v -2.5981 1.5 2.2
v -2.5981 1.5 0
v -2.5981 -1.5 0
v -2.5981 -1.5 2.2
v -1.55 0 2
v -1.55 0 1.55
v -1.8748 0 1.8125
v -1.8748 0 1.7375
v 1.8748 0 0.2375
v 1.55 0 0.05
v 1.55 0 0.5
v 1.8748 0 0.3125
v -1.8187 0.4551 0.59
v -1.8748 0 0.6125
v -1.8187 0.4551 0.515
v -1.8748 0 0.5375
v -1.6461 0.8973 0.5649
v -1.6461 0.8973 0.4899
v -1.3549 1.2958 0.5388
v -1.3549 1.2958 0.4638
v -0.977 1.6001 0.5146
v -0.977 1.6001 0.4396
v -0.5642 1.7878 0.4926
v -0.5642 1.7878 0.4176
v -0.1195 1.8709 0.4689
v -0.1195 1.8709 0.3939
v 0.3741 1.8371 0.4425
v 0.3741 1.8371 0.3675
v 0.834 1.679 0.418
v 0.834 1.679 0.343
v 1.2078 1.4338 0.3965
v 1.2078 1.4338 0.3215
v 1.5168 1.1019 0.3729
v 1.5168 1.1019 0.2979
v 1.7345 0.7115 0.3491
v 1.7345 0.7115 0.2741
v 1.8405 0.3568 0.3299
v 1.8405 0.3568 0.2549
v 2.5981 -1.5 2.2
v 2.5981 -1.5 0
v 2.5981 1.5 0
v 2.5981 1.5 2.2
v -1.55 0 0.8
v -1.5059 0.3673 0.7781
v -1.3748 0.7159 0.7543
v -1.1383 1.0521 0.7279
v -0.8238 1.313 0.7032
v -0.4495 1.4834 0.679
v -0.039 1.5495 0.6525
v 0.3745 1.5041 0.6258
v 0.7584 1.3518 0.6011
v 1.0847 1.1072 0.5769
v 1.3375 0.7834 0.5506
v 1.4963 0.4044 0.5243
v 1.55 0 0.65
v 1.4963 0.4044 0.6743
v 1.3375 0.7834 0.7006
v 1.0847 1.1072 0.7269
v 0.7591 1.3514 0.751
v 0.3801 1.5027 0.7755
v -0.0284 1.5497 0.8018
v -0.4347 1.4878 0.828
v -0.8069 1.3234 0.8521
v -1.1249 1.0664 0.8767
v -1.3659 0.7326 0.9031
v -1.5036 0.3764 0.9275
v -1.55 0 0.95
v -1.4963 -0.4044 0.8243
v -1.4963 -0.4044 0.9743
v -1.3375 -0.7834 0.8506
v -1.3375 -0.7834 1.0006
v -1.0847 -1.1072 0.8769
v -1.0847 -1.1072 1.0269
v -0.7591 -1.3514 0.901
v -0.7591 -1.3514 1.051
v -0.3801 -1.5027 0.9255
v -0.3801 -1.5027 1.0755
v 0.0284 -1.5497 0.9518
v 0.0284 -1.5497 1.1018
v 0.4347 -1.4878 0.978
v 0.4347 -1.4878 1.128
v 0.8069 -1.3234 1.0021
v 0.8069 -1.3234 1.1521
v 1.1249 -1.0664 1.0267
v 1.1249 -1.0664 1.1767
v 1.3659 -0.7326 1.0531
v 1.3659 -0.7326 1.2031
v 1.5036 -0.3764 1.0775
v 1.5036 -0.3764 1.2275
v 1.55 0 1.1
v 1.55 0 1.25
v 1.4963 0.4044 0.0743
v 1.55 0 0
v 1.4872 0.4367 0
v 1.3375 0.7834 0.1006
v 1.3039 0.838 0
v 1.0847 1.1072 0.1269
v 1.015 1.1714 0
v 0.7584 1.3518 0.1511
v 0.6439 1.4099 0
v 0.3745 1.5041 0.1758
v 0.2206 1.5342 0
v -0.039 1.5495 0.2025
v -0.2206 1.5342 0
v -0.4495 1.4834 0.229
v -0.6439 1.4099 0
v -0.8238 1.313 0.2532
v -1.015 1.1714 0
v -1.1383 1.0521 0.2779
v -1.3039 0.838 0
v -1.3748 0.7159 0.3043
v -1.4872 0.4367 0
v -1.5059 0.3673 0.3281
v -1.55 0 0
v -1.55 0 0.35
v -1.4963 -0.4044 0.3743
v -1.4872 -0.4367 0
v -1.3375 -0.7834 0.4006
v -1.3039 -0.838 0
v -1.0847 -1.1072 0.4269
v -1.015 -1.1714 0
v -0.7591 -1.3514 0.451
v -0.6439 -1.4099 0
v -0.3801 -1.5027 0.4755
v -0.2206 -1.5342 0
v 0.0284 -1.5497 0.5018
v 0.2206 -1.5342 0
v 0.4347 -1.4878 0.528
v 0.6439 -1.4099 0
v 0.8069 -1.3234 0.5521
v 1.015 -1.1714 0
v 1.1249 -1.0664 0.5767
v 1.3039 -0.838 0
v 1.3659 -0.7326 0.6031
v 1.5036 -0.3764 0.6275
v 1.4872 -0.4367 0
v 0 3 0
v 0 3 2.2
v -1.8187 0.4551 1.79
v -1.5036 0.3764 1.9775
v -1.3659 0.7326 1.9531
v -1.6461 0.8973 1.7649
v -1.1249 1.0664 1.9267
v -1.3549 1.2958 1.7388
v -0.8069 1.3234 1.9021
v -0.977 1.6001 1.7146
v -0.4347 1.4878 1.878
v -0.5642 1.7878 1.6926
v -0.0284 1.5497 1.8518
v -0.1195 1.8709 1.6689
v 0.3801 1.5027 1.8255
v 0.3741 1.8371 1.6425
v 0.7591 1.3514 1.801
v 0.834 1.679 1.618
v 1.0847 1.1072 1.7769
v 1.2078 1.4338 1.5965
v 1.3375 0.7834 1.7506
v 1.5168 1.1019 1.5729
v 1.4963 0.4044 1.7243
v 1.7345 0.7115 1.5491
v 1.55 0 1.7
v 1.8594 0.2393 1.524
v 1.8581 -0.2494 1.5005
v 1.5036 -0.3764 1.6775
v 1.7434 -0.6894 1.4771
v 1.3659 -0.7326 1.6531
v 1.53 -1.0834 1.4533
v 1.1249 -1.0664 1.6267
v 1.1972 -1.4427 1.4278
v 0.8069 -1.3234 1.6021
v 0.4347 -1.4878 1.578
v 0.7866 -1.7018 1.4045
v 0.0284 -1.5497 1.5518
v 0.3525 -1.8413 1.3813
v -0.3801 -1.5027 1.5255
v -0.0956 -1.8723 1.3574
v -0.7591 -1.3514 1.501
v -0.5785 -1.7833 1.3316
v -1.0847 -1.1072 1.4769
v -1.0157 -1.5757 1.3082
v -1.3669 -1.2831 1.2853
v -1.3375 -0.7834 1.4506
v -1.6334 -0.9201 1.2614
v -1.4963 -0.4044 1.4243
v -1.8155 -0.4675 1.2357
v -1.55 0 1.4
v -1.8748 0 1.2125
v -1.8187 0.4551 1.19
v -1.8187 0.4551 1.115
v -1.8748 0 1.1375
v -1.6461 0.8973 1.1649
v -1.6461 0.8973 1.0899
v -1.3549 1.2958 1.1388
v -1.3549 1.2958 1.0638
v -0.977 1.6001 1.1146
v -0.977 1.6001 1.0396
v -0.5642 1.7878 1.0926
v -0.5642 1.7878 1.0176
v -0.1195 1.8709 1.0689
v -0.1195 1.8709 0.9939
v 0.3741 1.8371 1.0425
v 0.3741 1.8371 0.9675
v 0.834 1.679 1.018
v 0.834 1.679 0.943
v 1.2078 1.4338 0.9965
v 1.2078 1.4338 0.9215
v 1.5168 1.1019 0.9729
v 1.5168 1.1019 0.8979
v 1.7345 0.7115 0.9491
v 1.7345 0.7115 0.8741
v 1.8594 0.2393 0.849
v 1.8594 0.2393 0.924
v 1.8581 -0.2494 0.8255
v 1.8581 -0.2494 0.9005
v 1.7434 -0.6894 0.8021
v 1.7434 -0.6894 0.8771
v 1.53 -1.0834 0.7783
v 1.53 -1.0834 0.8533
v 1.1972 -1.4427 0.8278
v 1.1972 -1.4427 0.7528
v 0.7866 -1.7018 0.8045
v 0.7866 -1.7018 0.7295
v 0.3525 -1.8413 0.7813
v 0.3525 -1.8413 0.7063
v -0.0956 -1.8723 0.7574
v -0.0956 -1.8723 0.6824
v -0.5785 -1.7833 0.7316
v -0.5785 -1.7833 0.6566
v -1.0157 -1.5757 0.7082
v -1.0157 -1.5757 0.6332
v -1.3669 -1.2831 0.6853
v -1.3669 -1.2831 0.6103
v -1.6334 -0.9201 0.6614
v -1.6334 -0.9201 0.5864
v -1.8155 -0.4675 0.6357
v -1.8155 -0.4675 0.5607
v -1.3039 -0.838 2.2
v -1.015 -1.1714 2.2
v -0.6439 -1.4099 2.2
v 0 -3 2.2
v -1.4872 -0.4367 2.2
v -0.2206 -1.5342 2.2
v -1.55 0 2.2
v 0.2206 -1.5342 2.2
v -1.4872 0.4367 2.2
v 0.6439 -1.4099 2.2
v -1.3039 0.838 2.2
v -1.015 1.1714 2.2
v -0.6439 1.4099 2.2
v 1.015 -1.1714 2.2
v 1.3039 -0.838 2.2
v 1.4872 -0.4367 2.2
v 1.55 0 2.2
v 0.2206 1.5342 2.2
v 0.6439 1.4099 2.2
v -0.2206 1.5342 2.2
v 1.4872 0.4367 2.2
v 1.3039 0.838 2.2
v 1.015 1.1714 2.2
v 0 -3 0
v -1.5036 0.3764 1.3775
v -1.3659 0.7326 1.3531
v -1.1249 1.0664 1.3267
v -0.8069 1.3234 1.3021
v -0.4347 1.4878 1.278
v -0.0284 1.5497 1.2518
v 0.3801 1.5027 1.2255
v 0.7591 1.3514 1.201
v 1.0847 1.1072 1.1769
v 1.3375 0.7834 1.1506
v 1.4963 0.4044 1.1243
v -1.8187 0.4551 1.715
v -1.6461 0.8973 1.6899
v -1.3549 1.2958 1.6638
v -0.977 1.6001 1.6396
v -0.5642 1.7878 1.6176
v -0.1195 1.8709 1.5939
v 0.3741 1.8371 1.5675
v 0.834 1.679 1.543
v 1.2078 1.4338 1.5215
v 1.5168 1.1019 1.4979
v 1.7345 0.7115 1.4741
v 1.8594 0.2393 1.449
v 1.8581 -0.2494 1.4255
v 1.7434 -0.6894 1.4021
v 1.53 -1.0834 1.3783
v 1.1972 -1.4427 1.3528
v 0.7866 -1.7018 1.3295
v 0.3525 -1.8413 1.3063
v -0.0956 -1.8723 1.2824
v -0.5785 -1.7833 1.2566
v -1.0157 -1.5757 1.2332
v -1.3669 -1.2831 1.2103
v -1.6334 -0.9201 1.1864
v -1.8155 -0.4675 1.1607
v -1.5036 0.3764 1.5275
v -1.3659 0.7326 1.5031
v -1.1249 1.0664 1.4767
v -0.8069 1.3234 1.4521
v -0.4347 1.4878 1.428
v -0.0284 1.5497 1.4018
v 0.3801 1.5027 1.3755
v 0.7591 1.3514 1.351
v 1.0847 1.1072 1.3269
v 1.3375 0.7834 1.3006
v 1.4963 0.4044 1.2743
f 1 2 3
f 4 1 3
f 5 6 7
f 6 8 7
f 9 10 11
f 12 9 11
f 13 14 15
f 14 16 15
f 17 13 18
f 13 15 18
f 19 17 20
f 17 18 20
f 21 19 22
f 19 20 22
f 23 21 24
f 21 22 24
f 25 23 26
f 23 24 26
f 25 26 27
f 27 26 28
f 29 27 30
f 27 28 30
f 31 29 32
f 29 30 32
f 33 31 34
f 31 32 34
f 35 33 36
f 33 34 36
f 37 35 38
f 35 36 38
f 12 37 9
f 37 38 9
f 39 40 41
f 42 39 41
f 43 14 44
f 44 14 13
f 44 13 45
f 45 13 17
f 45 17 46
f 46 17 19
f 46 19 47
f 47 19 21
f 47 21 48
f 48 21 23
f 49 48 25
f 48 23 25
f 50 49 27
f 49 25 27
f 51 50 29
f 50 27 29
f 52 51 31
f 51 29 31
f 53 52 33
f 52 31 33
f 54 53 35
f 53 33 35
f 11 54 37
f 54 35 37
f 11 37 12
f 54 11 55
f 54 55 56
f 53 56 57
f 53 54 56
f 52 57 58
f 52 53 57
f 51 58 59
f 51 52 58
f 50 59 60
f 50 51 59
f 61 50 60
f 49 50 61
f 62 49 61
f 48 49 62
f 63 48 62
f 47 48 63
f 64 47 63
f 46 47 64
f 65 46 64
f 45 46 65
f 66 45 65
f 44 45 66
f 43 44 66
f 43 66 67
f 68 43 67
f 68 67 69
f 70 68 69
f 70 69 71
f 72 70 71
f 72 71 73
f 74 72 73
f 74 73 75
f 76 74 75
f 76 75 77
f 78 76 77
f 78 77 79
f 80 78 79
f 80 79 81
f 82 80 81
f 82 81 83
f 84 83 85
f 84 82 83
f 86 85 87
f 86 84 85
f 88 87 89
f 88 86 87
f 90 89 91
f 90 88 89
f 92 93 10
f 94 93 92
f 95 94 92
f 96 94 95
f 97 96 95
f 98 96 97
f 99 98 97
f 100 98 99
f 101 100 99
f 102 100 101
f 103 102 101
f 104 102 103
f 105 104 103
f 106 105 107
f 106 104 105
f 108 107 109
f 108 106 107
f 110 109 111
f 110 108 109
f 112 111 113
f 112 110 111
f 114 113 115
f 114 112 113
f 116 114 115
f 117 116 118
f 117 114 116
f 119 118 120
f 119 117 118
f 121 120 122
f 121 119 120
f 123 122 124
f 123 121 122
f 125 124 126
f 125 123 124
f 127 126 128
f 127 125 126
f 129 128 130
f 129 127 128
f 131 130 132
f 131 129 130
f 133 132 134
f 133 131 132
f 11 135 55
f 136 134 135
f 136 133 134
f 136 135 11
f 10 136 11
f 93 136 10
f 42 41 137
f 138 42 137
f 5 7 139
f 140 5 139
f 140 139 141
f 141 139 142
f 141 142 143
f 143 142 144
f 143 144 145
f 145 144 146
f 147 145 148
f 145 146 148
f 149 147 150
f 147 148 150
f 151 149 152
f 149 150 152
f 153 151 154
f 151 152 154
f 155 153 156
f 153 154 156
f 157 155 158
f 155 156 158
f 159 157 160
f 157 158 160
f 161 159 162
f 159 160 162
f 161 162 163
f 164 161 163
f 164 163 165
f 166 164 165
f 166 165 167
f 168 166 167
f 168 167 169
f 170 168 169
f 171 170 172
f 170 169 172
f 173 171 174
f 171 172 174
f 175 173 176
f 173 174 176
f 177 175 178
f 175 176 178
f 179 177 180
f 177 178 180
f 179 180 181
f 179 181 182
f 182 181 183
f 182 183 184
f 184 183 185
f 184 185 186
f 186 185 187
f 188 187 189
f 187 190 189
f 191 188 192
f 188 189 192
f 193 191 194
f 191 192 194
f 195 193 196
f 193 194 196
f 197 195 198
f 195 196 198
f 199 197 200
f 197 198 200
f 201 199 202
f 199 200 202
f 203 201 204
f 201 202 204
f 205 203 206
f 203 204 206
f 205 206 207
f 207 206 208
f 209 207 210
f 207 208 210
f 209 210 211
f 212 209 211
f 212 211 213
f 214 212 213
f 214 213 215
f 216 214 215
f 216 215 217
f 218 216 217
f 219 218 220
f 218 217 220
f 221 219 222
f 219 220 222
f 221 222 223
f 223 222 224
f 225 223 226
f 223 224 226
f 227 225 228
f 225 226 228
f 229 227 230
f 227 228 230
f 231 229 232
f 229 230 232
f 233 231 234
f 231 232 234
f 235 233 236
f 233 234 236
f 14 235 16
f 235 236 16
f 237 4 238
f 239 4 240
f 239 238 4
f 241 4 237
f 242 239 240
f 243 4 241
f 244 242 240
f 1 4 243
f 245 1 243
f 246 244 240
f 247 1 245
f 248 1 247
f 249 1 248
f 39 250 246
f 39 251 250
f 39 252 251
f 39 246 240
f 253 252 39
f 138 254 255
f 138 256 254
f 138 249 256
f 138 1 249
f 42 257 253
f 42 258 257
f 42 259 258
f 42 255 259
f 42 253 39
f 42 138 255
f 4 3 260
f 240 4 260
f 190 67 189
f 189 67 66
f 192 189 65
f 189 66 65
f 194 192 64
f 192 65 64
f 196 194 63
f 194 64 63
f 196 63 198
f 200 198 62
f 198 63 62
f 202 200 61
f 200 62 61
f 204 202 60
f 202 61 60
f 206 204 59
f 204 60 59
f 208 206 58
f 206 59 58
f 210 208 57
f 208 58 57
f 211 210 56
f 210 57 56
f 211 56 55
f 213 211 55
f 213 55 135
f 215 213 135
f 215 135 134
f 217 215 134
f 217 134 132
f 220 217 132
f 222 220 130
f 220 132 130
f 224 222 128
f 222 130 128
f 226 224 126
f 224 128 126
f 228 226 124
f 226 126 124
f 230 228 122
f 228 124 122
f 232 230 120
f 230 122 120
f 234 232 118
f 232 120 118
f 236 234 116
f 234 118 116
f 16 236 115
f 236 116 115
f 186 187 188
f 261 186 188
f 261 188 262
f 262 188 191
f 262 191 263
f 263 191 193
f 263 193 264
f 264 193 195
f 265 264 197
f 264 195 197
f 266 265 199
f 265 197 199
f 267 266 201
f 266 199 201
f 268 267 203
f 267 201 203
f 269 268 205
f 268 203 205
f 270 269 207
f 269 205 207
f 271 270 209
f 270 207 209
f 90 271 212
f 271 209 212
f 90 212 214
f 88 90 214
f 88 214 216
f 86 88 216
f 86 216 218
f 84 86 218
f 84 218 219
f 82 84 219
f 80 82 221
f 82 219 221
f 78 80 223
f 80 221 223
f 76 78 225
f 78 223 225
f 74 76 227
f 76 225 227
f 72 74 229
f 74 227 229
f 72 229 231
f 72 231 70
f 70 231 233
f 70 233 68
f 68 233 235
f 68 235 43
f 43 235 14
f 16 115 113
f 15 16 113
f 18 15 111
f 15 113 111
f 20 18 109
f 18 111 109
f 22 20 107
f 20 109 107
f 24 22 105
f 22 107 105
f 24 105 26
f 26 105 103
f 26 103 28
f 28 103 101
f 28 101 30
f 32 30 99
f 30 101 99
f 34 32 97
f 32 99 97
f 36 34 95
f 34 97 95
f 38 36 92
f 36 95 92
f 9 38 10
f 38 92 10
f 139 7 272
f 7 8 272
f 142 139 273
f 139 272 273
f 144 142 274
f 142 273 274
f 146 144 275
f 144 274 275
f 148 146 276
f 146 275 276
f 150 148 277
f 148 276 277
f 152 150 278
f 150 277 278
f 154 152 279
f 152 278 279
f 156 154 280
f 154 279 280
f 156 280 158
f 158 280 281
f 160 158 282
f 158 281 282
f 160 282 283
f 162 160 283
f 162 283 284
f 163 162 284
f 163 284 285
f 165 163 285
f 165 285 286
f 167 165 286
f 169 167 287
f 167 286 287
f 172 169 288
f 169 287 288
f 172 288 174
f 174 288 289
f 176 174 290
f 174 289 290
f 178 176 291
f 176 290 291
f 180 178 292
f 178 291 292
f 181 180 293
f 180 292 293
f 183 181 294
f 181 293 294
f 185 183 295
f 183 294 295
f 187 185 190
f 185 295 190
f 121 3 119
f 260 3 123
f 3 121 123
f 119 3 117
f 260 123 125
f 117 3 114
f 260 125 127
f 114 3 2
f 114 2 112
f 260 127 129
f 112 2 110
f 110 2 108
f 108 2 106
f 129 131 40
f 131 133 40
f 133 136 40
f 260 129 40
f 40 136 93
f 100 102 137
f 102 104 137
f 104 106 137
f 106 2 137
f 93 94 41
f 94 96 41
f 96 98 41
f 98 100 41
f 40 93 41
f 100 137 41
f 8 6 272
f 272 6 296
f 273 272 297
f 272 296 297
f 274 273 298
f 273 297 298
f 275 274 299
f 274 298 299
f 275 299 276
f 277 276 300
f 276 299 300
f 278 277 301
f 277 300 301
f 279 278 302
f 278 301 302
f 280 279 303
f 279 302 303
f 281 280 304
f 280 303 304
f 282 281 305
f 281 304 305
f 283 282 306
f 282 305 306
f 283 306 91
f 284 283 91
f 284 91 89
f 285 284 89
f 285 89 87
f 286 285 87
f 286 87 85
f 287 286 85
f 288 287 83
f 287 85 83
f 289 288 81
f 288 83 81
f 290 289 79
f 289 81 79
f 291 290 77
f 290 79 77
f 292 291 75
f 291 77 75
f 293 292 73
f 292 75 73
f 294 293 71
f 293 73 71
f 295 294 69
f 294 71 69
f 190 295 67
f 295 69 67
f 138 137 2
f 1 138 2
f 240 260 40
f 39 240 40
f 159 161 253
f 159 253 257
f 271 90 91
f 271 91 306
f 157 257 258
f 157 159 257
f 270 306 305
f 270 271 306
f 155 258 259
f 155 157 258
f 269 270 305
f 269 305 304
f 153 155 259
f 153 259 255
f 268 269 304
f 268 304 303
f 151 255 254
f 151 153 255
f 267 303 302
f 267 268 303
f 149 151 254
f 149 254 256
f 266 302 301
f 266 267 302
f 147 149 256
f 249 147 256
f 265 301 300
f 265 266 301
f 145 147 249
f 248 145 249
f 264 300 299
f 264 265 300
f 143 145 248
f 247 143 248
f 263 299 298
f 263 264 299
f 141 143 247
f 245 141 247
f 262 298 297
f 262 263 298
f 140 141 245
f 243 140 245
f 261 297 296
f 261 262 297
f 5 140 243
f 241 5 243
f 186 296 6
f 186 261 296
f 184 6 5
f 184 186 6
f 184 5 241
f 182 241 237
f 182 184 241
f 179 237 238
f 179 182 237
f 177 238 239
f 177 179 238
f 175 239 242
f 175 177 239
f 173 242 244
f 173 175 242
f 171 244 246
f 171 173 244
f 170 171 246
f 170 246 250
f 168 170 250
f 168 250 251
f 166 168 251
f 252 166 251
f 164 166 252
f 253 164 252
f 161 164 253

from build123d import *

# Parameters (mm, degrees)
SKETCH1_R           = 1.55
BOSS_EXTRUDE1_DEPTH = 2.2
THREAD1_PITCH       = 0.6


with BuildPart() as part:
    # Sketch1 → Boss-Extrude1 (new body)
    with BuildSketch(Plane.XY):
        Polygon((-2.598076211, -1.5), (0, -3), (2.598076211, -1.5), (2.598076211, 1.5), (0, 3), (-2.598076211, 1.5), align=None)
        Circle(SKETCH1_R, mode=Mode.SUBTRACT)
    extrude(amount=BOSS_EXTRUDE1_DEPTH)

    # Thread1: the profile of Thread Profile1 profile screwed along a right-hand helix of 2.5 turns, 6 arcs to a turn; built about Z, then put on its axis
    thread1_z = Axis((0, 0, 0), (0, 0, 1))
    thread1_corners = [(1.5497, 0, -0.000173205), (1.874759525, 0, 0.187499999), (1.874759525, 0, 0.262499999), (1.5497, 0, 0.450173203)]
    with BuildLine(mode=Mode.PRIVATE) as thread1_profile:
        Line(thread1_corners[0], thread1_corners[1])
        Line(thread1_corners[1], thread1_corners[2])
        Line(thread1_corners[2], thread1_corners[3])
        Line(thread1_corners[3], thread1_corners[0])
    thread1_cap = Face(thread1_profile.wire())
    thread1_turn_angles = [0, 30, 60, 90, 120, 150, 180, 210, 240, 270, 300, 330, 360]
    thread1_turn_weights = [1, 0.8660254037844387, 1, 0.8660254037844387, 1, 0.8660254037844387, 1, 0.8660254037844387, 1, 0.8660254037844387, 1, 0.8660254037844387, 1]
    thread1_turn_rails = [Edge.make_bspline([Vector(p[0], p[1], 0).rotate(thread1_z, thread1_turn_angles[k]) / thread1_turn_weights[k] + Vector(0, 0, p[2] + THREAD1_PITCH * thread1_turn_angles[k] / 360) for k in range(13)], [0, 0, 0, 1, 1, 2, 2, 3, 3, 4, 4, 5, 5, 6, 6, 6], 2, thread1_turn_weights) for p in thread1_corners]
    thread1_turn_sides = [Face.make_surface_from_curves(thread1_turn_rails[p[0]], thread1_turn_rails[p[1]]) for p in [(0, 1), (1, 2), (2, 3), (3, 0)]]
    thread1_last_angles = [720, 750, 780, 810, 840, 870, 900]
    thread1_last_weights = [1, 0.8660254037844387, 1, 0.8660254037844387, 1, 0.8660254037844387, 1]
    thread1_last_rails = [Edge.make_bspline([Vector(p[0], p[1], 0).rotate(thread1_z, thread1_last_angles[k]) / thread1_last_weights[k] + Vector(0, 0, p[2] + THREAD1_PITCH * thread1_last_angles[k] / 360) for k in range(7)], [0, 0, 0, 1, 1, 2, 2, 3, 3, 3], 2, thread1_last_weights) for p in thread1_corners]
    thread1_last_sides = [Face.make_surface_from_curves(thread1_last_rails[p[0]], thread1_last_rails[p[1]]) for p in [(0, 1), (1, 2), (2, 3), (3, 0)]]
    thread1 = Plane(origin=(0, 0, 2), x_dir=(-1, 0, 0), z_dir=(0, 0, -1)) * Solid(Shell([*[p.moved(Location((0, 0, THREAD1_PITCH * i))) for i in range(2) for p in thread1_turn_sides], *thread1_last_sides, thread1_cap, thread1_cap.rotate(thread1_z, 900).moved(Location((0, 0, THREAD1_PITCH * 900 / 360)))]))
    add(thread1, mode=Mode.SUBTRACT)


solid = part.part
